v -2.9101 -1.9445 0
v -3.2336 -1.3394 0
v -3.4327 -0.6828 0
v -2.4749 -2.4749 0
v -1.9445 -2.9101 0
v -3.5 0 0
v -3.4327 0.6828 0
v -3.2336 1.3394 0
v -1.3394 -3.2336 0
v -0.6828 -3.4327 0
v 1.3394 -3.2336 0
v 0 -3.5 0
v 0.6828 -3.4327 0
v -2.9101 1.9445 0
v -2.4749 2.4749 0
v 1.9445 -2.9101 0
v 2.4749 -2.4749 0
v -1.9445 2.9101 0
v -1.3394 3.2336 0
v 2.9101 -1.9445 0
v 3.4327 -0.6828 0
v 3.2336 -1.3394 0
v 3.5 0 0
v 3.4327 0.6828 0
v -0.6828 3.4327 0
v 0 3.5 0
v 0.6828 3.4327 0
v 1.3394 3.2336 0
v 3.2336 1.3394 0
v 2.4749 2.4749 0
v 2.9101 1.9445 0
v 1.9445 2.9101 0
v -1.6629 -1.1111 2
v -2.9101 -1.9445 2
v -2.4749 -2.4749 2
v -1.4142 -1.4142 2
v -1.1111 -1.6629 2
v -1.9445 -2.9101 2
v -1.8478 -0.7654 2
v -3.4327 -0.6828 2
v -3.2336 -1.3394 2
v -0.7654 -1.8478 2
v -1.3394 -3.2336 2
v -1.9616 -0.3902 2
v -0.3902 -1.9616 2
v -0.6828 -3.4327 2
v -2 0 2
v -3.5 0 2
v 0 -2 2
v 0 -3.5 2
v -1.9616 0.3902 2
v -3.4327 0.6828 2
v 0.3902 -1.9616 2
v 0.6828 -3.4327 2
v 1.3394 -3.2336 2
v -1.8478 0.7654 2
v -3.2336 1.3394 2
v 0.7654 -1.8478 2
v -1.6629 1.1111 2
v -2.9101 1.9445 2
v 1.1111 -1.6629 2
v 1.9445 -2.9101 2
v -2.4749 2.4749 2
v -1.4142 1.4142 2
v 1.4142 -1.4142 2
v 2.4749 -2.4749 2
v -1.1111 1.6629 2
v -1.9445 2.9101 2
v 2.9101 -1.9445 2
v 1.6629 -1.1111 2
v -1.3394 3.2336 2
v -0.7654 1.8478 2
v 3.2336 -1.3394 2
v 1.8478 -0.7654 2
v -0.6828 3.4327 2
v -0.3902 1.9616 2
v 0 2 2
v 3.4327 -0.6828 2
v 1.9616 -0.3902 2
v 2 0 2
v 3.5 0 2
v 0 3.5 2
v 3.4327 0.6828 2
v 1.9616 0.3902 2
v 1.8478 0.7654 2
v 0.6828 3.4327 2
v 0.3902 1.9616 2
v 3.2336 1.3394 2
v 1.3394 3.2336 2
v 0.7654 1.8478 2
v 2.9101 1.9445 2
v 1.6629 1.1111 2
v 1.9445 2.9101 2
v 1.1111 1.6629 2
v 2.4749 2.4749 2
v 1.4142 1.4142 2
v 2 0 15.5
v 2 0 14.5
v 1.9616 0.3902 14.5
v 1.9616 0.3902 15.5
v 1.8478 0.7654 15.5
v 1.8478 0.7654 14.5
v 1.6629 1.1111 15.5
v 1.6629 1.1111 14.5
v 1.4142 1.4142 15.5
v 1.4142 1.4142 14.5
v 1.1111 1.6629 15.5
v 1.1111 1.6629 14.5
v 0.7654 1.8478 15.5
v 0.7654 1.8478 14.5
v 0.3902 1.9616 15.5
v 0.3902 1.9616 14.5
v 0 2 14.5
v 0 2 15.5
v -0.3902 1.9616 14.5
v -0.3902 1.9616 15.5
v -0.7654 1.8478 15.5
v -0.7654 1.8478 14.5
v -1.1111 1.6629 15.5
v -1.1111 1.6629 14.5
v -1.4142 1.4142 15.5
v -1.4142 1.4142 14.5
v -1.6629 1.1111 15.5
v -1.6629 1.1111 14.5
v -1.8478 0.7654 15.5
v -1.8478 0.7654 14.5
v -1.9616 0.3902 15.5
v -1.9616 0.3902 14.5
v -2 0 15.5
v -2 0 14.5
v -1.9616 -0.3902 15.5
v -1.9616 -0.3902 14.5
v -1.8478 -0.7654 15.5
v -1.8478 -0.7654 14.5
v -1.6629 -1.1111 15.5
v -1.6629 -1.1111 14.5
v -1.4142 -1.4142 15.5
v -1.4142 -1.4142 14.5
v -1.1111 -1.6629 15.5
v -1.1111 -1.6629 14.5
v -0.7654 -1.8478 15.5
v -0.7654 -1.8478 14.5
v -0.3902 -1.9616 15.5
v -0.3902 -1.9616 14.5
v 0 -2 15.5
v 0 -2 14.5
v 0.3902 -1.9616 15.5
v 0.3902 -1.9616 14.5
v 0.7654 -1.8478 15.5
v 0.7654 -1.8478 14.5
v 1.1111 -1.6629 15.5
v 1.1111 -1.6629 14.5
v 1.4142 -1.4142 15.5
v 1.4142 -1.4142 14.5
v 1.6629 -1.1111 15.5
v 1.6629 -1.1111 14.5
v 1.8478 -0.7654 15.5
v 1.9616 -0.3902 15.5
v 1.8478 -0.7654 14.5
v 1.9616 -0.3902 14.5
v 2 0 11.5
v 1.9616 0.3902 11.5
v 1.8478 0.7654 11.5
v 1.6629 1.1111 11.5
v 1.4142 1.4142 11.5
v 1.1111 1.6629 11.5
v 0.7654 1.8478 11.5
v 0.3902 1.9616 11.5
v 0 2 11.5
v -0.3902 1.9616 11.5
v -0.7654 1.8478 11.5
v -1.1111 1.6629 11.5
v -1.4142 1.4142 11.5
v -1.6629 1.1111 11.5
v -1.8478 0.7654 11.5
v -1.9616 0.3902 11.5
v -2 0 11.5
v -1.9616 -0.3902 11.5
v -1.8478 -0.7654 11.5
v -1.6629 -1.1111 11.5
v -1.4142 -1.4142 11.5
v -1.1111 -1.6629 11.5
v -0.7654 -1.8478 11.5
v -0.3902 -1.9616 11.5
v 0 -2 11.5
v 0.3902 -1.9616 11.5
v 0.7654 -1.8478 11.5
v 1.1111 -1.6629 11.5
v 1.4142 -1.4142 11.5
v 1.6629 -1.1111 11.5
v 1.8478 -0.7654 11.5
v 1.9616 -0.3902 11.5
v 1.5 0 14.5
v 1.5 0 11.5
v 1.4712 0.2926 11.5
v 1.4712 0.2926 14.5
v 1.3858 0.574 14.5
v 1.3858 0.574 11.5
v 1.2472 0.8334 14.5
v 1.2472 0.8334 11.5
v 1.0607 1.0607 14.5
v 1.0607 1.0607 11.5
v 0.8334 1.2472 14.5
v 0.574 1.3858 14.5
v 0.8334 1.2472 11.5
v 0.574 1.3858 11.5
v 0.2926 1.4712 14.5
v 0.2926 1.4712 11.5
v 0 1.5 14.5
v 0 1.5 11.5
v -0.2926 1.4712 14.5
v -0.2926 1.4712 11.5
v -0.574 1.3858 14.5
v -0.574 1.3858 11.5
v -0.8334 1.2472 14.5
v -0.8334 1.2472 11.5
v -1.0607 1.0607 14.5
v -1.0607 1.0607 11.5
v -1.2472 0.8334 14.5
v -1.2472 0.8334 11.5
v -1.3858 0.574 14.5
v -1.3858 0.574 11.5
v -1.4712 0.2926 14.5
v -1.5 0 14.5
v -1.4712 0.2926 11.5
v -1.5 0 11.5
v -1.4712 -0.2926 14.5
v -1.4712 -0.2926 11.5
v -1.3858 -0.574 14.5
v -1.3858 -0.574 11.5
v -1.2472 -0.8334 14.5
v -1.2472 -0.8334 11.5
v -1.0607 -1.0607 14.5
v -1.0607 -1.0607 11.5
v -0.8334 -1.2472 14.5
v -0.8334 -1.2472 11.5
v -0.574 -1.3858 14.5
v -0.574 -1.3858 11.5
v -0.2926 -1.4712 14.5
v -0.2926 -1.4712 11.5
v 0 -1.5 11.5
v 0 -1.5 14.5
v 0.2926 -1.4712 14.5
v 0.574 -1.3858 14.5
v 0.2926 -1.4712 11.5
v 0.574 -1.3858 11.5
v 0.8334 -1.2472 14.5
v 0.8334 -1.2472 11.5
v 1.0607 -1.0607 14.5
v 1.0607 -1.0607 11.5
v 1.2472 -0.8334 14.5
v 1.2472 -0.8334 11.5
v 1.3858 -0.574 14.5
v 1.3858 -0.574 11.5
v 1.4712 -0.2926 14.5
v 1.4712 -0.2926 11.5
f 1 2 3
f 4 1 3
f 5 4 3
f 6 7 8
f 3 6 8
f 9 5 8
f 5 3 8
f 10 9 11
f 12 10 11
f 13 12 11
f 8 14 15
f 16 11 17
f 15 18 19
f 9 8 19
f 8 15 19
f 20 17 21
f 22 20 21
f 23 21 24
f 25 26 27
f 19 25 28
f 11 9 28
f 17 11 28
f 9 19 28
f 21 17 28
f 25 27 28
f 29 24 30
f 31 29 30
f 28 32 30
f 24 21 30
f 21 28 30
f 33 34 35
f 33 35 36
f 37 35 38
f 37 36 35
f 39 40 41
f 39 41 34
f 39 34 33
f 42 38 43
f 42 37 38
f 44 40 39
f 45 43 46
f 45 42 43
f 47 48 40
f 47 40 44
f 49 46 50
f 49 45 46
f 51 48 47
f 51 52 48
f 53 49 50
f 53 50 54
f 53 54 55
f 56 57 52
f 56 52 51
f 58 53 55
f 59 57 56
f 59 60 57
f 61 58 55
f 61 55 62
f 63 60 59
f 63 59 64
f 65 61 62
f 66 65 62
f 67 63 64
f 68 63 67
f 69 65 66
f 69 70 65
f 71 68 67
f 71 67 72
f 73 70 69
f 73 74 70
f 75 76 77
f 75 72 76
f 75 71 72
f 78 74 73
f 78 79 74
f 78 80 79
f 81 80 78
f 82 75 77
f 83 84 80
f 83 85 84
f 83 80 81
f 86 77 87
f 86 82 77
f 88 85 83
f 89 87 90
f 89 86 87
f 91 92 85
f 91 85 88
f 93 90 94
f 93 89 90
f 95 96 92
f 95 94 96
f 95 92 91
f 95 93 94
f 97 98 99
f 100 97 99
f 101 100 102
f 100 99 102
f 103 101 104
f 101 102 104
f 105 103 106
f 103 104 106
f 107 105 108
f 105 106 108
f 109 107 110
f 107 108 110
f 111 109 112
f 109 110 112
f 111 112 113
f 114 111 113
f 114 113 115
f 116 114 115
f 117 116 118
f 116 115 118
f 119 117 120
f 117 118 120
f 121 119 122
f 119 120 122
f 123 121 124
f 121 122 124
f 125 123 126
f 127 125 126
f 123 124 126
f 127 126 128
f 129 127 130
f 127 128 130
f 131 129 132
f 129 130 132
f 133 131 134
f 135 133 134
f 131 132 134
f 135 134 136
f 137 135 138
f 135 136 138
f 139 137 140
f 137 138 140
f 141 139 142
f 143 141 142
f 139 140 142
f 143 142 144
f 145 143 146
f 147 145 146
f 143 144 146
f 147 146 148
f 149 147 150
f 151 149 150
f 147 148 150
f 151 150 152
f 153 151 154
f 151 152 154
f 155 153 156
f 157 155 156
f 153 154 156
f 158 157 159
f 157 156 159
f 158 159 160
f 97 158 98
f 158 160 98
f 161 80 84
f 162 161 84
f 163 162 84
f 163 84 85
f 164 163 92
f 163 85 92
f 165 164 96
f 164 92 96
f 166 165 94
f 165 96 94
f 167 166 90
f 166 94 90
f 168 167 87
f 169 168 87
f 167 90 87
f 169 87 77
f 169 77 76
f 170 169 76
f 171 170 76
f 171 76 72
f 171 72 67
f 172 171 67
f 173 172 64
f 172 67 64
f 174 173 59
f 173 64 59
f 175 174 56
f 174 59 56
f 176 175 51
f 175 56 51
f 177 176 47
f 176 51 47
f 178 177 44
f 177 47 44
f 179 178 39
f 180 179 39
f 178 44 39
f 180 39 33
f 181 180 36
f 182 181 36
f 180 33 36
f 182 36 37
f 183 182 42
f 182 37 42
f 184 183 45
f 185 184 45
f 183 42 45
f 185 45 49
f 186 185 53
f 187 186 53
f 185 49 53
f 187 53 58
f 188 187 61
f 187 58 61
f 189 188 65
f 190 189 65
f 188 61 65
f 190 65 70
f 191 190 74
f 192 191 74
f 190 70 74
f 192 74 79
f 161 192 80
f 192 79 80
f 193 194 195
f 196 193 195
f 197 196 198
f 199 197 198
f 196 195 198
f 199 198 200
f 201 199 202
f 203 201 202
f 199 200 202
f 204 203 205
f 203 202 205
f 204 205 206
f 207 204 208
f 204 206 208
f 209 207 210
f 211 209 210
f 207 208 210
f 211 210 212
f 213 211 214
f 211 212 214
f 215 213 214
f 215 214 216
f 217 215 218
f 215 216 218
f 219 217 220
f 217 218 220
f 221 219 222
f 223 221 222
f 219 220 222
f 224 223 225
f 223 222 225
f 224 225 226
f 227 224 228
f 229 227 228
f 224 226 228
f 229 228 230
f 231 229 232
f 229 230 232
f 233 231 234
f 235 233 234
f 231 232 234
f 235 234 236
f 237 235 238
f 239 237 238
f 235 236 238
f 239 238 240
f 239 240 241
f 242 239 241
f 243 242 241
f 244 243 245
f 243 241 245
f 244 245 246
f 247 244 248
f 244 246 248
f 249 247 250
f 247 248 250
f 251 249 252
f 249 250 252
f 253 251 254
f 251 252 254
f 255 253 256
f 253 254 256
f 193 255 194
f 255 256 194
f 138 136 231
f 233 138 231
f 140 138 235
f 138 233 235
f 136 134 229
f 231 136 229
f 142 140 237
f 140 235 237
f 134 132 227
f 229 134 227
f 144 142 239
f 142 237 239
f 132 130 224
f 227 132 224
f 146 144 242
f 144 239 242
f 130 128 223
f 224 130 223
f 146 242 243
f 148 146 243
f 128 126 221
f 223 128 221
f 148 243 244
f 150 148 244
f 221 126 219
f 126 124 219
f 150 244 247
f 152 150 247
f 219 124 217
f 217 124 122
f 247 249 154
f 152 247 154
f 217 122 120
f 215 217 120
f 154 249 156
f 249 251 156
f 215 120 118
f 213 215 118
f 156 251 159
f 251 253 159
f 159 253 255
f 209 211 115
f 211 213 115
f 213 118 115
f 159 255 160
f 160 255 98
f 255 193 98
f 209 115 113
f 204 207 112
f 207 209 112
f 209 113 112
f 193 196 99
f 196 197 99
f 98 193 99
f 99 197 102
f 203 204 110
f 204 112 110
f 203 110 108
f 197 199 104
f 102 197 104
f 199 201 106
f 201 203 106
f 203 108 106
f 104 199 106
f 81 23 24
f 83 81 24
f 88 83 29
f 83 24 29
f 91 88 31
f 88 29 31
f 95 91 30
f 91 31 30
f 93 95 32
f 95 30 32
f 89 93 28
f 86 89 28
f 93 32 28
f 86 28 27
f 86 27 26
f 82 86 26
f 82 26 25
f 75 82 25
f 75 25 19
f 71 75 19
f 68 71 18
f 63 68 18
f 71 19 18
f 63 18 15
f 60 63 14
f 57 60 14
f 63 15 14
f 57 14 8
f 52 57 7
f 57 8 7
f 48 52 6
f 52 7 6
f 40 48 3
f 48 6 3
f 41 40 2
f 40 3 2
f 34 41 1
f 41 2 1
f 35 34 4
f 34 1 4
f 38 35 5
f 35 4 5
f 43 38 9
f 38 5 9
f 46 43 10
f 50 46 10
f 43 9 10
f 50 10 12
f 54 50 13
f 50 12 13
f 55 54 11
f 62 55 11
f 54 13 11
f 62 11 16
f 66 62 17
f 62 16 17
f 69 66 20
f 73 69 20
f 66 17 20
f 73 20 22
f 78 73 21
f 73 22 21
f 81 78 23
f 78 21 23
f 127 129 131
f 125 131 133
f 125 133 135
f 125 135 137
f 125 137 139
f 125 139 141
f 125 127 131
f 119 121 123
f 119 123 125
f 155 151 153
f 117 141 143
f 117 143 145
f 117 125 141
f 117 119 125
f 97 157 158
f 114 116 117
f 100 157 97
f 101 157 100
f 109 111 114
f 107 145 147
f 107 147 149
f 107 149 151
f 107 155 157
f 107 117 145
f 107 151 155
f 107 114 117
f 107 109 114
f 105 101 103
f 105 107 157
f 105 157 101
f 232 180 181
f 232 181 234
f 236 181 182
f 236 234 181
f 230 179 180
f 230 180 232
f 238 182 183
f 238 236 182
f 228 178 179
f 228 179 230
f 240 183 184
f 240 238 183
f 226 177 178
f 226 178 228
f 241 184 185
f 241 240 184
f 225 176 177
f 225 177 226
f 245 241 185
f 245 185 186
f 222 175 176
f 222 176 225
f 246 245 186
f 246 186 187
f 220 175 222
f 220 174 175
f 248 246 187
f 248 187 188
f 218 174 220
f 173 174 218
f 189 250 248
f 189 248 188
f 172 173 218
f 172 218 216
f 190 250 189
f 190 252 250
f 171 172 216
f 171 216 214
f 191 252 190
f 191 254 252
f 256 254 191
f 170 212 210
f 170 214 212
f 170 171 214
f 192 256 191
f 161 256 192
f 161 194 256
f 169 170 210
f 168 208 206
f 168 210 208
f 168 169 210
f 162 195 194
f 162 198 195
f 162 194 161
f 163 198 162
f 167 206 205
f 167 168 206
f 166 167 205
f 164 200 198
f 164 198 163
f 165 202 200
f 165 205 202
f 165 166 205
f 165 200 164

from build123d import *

# Parameters (mm, degrees)
SKETCH_R     = 3.5
PAD_DEPTH    = 2
SKETCH001_R  = 2
PAD001_DEPTH = 9.5
SKETCH002_R  = 1.5
PAD002_DEPTH = 3
SKETCH003_R  = 2
PAD003_DEPTH = 1


with BuildPart() as part:
    # Sketch → Pad (new body)
    with BuildSketch(Plane.XY):
        Circle(SKETCH_R)
    extrude(amount=PAD_DEPTH)

    # Sketch001 (on Face3 of Pad) → Pad001 (join)
    with BuildSketch(Plane.XY.offset(2)):
        Circle(SKETCH001_R)
    extrude(amount=PAD001_DEPTH)

    # Sketch002 (on Face5 of Pad001) → Pad002 (join)
    with BuildSketch(Plane.XY.offset(11.5)):
        Circle(SKETCH002_R)
    extrude(amount=PAD002_DEPTH)

    # Sketch003 (on Face7 of Pad002) → Pad003 (join)
    with BuildSketch(Plane.XY.offset(14.5)):
        Circle(SKETCH003_R)
    extrude(amount=PAD003_DEPTH)


solid = part.part
